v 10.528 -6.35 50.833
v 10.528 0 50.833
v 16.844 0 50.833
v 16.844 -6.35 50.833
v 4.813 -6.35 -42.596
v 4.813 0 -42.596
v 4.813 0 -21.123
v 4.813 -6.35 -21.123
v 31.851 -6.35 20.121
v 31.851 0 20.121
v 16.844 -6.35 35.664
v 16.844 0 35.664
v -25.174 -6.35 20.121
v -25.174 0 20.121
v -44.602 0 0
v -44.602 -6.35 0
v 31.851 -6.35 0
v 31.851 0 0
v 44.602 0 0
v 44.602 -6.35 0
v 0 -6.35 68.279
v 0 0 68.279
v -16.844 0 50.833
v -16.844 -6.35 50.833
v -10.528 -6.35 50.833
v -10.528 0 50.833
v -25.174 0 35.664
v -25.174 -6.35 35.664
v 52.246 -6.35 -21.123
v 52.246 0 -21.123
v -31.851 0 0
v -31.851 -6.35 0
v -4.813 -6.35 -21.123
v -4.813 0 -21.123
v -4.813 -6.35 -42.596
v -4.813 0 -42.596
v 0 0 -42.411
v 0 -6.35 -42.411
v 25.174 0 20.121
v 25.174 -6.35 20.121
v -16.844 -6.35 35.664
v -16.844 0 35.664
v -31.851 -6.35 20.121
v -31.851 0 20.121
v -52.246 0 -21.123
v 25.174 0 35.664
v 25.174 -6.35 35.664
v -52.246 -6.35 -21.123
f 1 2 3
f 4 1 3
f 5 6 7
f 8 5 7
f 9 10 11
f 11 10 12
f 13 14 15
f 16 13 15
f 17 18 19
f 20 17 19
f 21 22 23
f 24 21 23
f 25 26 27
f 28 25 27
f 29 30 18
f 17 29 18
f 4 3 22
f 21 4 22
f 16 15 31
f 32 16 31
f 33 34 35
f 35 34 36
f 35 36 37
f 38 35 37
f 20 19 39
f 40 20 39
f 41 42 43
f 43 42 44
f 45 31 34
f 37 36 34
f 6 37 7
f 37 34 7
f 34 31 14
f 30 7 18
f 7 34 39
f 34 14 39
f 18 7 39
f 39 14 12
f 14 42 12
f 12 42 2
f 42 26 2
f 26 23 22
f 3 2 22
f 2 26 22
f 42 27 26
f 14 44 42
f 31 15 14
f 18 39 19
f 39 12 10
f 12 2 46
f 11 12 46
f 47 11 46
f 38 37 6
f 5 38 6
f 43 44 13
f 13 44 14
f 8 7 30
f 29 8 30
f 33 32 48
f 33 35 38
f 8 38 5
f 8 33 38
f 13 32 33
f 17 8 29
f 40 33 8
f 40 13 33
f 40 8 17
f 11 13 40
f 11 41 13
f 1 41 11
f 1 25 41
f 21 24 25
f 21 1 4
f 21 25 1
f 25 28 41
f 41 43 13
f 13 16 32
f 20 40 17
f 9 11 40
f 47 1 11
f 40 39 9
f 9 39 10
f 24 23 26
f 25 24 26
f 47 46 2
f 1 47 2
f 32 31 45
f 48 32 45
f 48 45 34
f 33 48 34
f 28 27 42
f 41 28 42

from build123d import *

# Parameters (mm, degrees)
F1_DEPTH = 6.35


with BuildPart() as f1:
    # F0 (on Front) → F1 (new body)
    with BuildSketch(Plane.XZ):
        Polygon((16.844211, 50.833423), (0, 68.279214), (-16.844211, 50.833423), (-10.527632, 50.833423), (-25.174322, 35.663635), (-16.844211, 35.663635), (-31.850775, 20.121122), (-25.174322, 20.121122), (-44.60161, 0), (-31.850775, 0), (-52.245557, -21.123168), (-4.812632, -21.123168), (-4.812632, -42.596416), (0, -42.411316), (4.812632, -42.596416), (4.812632, -21.123168), (52.245557, -21.123168), (31.850775, 0), (44.60161, 0), (25.174322, 20.121122), (31.850775, 20.121122), (16.844211, 35.663635), (25.174322, 35.663635), (10.527632, 50.833423), align=None)
    extrude(amount=F1_DEPTH)


solid = f1.part
